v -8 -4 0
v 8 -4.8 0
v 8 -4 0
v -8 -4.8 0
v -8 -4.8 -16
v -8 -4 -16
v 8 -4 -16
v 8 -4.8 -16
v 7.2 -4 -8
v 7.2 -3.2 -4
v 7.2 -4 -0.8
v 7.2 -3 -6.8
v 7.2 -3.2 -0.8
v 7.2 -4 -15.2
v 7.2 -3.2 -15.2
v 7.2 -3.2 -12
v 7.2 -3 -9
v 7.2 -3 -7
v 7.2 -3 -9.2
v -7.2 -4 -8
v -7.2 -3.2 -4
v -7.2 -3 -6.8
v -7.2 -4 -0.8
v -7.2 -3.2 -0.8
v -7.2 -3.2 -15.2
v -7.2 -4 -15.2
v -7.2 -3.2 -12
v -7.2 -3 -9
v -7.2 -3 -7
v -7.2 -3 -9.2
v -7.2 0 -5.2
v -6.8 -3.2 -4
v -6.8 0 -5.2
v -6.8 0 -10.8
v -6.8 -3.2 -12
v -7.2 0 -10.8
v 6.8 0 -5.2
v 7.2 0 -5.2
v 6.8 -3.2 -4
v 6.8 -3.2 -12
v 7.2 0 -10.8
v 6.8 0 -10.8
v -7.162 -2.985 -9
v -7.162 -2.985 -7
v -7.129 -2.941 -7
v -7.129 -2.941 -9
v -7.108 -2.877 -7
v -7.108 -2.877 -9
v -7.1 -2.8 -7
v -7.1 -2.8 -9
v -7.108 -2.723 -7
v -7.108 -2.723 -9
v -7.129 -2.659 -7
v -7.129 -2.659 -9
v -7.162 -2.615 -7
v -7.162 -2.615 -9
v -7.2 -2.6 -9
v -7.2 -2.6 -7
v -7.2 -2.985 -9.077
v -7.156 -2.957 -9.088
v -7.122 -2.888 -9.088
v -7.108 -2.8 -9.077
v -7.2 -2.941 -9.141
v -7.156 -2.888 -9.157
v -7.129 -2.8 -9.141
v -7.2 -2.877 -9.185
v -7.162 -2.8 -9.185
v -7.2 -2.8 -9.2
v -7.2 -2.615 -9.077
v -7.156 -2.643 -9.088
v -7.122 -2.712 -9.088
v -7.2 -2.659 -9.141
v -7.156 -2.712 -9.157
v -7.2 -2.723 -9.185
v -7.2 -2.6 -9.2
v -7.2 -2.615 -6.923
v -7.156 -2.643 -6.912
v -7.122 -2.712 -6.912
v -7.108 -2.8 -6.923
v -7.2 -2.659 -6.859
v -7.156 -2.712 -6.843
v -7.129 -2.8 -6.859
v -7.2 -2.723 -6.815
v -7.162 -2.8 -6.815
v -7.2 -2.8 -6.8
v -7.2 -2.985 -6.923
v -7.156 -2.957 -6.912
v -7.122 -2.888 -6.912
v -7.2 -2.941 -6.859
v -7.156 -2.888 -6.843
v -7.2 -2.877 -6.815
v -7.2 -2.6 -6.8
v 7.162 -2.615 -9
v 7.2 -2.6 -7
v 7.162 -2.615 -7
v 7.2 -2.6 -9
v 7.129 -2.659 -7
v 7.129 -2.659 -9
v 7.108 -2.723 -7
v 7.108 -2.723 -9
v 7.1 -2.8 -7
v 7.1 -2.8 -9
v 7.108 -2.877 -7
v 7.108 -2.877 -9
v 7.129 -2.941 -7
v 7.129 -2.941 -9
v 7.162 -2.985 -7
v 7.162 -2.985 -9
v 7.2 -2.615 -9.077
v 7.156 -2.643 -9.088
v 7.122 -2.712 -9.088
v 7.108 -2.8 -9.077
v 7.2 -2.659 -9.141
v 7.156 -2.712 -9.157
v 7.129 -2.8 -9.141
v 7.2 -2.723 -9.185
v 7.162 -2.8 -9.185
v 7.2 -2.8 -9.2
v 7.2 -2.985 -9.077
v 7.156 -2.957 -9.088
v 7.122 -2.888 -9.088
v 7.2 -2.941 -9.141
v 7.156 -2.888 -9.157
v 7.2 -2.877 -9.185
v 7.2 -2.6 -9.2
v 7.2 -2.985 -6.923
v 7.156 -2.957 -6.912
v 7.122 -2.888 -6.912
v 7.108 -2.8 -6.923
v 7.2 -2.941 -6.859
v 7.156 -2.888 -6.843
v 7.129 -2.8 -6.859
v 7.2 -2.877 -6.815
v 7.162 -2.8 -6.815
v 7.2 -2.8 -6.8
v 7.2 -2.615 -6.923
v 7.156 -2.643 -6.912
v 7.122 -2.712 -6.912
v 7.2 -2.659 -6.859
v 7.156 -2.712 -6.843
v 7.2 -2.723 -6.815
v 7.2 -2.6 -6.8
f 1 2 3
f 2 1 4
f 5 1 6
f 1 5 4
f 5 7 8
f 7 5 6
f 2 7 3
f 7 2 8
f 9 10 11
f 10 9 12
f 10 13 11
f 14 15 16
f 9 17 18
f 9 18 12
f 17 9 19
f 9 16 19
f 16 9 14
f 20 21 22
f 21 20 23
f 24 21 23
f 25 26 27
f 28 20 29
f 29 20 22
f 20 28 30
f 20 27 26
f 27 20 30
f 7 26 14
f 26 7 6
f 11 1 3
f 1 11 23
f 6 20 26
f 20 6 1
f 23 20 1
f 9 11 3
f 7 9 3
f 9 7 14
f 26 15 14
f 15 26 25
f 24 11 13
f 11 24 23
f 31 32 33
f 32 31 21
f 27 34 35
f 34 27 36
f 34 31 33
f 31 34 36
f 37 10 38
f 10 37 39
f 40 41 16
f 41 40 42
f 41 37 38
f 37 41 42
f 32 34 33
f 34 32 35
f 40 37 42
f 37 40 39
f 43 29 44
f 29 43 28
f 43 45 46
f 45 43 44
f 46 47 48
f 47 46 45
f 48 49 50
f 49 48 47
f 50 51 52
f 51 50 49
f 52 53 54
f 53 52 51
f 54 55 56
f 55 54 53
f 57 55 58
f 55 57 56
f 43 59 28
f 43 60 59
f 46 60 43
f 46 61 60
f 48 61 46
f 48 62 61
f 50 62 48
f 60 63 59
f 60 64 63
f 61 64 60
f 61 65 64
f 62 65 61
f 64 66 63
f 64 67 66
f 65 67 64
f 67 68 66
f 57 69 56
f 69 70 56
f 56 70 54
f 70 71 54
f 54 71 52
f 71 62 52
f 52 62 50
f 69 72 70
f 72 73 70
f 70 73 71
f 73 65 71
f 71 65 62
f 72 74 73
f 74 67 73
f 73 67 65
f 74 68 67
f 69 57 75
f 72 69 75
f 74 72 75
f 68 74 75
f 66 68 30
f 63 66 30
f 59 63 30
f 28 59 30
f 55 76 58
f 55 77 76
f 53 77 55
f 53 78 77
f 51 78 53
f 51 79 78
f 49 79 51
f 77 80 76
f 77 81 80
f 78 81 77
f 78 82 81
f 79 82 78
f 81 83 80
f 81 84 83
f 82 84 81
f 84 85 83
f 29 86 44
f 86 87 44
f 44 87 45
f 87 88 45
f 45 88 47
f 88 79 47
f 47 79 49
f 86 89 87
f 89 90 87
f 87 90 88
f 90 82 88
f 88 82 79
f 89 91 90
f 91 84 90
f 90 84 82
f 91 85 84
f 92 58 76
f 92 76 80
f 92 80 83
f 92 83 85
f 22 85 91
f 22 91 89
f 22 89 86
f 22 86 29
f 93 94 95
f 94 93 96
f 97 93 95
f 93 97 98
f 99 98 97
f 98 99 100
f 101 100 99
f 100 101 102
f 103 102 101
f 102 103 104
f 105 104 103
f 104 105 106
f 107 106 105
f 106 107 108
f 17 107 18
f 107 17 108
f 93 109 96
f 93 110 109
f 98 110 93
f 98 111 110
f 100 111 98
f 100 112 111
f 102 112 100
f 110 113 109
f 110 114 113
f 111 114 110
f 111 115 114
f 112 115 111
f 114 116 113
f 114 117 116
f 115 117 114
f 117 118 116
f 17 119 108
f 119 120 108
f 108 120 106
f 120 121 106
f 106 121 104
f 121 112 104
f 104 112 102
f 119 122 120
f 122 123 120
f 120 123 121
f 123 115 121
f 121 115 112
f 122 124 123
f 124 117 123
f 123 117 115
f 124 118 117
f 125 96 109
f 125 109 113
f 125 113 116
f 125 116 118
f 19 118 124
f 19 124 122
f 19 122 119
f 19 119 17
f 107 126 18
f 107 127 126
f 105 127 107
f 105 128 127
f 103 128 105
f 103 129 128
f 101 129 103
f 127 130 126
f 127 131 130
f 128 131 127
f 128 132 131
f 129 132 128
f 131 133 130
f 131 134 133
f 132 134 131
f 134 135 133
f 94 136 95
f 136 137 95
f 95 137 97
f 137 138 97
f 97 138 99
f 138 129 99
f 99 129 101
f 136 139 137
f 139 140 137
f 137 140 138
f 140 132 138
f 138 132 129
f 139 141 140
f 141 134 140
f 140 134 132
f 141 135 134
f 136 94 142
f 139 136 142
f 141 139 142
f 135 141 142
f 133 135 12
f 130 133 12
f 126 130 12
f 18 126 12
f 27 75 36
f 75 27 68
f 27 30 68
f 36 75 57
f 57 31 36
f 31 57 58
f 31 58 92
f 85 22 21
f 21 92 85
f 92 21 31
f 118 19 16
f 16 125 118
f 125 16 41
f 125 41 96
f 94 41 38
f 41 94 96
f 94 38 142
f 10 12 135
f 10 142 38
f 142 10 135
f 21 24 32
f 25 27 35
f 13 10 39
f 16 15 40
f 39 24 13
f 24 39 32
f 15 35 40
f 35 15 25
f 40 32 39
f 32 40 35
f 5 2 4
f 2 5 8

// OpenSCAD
// file: ../p/1-8sphe.scad
use <../lib.scad>
function ldraw_lib__1_8sphe() = [
// 0 Sphere 0.125
// 0 Name: 1-8sphe.dat
// 0 Author: James Jessiman
// 0 !LDRAW_ORG Primitive UPDATE 2012-03
// 0 !LICENSE Licensed under CC BY 4.0 : see CAreadme.txt
// 
// 0 BFC CERTIFY CCW
  [0,"BFC","CERTIFY"],
  [0,"BFC","CCW"],
// 
// 0 !HISTORY 2000-08-01 {Axel Poque} fixes to resolve L3P error messages.
// 0 !HISTORY 2000-08-01 {Manfred Moolhuysen} fixes to resolve L3P error messages.
// 0 !HISTORY 2000-09-30 [PTadmin] Official Update 2000-02
// 0 !HISTORY 2002-03-28 [hafhead] Made BFC compliant
// 0 !HISTORY 2002-04-25 [PTadmin] Official Update 2002-02
// 0 !HISTORY 2007-06-22 [PTadmin] Header formatted for Contributor Agreement
// 0 !HISTORY 2008-07-01 [PTadmin] Official Update 2008-01
// 0 !HISTORY 2010-09-12 [MagFors] Changed winding, removed duplicated cond-line, optimized filesize
// 0 !HISTORY 2010-12-31 [PTadmin] Official Update 2010-03
// 0 !HISTORY 2012-07-01 [tcobbs] Replaced with geometry from LDView
// 0 !HISTORY 2012-12-28 [PTadmin] Official Update 2012-03
// 
// 
// 3 16 1 0 0 0.9239 0.3827 0 0.9239 0 0.3827
  [3,16,1,0,0,0.9239,0.3827,0,0.9239,0,0.3827],
// 3 16 0.9239 0.3827 0 0.7836 0.4393 0.4393 0.9239 0 0.3827
  [3,16,0.9239,0.3827,0,0.7836,0.4393,0.4393,0.9239,0,0.3827],
// 3 16 0.9239 0 0.3827 0.7836 0.4393 0.4393 0.7071 0 0.7071
  [3,16,0.9239,0,0.3827,0.7836,0.4393,0.4393,0.7071,0,0.7071],
// 3 16 0.7836 0.4393 0.4393 0.4393 0.4393 0.7836 0.7071 0 0.7071
  [3,16,0.7836,0.4393,0.4393,0.4393,0.4393,0.7836,0.7071,0,0.7071],
// 3 16 0.7071 0 0.7071 0.4393 0.4393 0.7836 0.3827 0 0.9239
  [3,16,0.7071,0,0.7071,0.4393,0.4393,0.7836,0.3827,0,0.9239],
// 3 16 0.4393 0.4393 0.7836 0 0.3827 0.9239 0.3827 0 0.9239
  [3,16,0.4393,0.4393,0.7836,0,0.3827,0.9239,0.3827,0,0.9239],
// 3 16 0.3827 0 0.9239 0 0.3827 0.9239 0 0 1
  [3,16,0.3827,0,0.9239,0,0.3827,0.9239,0,0,1],
// 3 16 0.9239 0.3827 0 0.7071 0.7071 0 0.7836 0.4393 0.4393
  [3,16,0.9239,0.3827,0,0.7071,0.7071,0,0.7836,0.4393,0.4393],
// 3 16 0.7071 0.7071 0 0.4393 0.7836 0.4393 0.7836 0.4393 0.4393
  [3,16,0.7071,0.7071,0,0.4393,0.7836,0.4393,0.7836,0.4393,0.4393],
// 3 16 0.7836 0.4393 0.4393 0.4393 0.7836 0.4393 0.4393 0.4393 0.7836
  [3,16,0.7836,0.4393,0.4393,0.4393,0.7836,0.4393,0.4393,0.4393,0.7836],
// 3 16 0.4393 0.7836 0.4393 0 0.7071 0.7071 0.4393 0.4393 0.7836
  [3,16,0.4393,0.7836,0.4393,0,0.7071,0.7071,0.4393,0.4393,0.7836],
// 3 16 0.4393 0.4393 0.7836 0 0.7071 0.7071 0 0.3827 0.9239
  [3,16,0.4393,0.4393,0.7836,0,0.7071,0.7071,0,0.3827,0.9239],
// 3 16 0.7071 0.7071 0 0.3827 0.9239 0 0.4393 0.7836 0.4393
  [3,16,0.7071,0.7071,0,0.3827,0.9239,0,0.4393,0.7836,0.4393],
// 3 16 0.3827 0.9239 0 0 0.9239 0.3827 0.4393 0.7836 0.4393
  [3,16,0.3827,0.9239,0,0,0.9239,0.3827,0.4393,0.7836,0.4393],
// 3 16 0.4393 0.7836 0.4393 0 0.9239 0.3827 0 0.7071 0.7071
  [3,16,0.4393,0.7836,0.4393,0,0.9239,0.3827,0,0.7071,0.7071],
// 3 16 0.3827 0.9239 0 0 1 0 0 0.9239 0.3827
  [3,16,0.3827,0.9239,0,0,1,0,0,0.9239,0.3827],
// 
// 5 24 1 0 0 0.9239 0.3827 0 1 0 -0.1 0.9239 0 0.3827
  [5,24,1,0,0,0.9239,0.3827,0,1,0,-0.1,0.9239,0,0.3827],
// 5 24 0.9239 0.3827 0 0.9239 0 0.3827 1 0 0 0.7836 0.4393 0.4393
  [5,24,0.9239,0.3827,0,0.9239,0,0.3827,1,0,0,0.7836,0.4393,0.4393],
// 5 24 1 0 0 0.9239 0 0.3827 0.9239 0.3827 0 1 -0.1 0
  [5,24,1,0,0,0.9239,0,0.3827,0.9239,0.3827,0,1,-0.1,0],
// 5 24 0.9239 0 0.3827 0.7836 0.4393 0.4393 0.9239 0.3827 0 0.7071 0 0.7071
  [5,24,0.9239,0,0.3827,0.7836,0.4393,0.4393,0.9239,0.3827,0,0.7071,0,0.7071],
// 5 24 0.7836 0.4393 0.4393 0.7071 0 0.7071 0.9239 0 0.3827 0.4393 0.4393 0.7836
  [5,24,0.7836,0.4393,0.4393,0.7071,0,0.7071,0.9239,0,0.3827,0.4393,0.4393,0.7836],
// 5 24 0.9239 0 0.3827 0.7071 0 0.7071 0.7836 0.4393 0.4393 0.9239 -0.1 0.3827
  [5,24,0.9239,0,0.3827,0.7071,0,0.7071,0.7836,0.4393,0.4393,0.9239,-0.1,0.3827],
// 5 24 0.7071 0 0.7071 0.4393 0.4393 0.7836 0.7836 0.4393 0.4393 0.3827 0 0.9239
  [5,24,0.7071,0,0.7071,0.4393,0.4393,0.7836,0.7836,0.4393,0.4393,0.3827,0,0.9239],
// 5 24 0.4393 0.4393 0.7836 0.3827 0 0.9239 0.7071 0 0.7071 0 0.3827 0.9239
  [5,24,0.4393,0.4393,0.7836,0.3827,0,0.9239,0.7071,0,0.7071,0,0.3827,0.9239],
// 5 24 0.7071 0 0.7071 0.3827 0 0.9239 0.4393 0.4393 0.7836 0.7071 -0.1 0.7071
  [5,24,0.7071,0,0.7071,0.3827,0,0.9239,0.4393,0.4393,0.7836,0.7071,-0.1,0.7071],
// 5 24 0.3827 0 0.9239 0 0.3827 0.9239 0.4393 0.4393 0.7836 0 0 1
  [5,24,0.3827,0,0.9239,0,0.3827,0.9239,0.4393,0.4393,0.7836,0,0,1],
// 5 24 0 0.3827 0.9239 0 0 1 0.3827 0 0.9239 -0.1 0.3827 0.9239
  [5,24,0,0.3827,0.9239,0,0,1,0.3827,0,0.9239,-0.1,0.3827,0.9239],
// 5 24 0.3827 0 0.9239 0 0 1 0 0.3827 0.9239 0.3827 -0.1 0.9239
  [5,24,0.3827,0,0.9239,0,0,1,0,0.3827,0.9239,0.3827,-0.1,0.9239],
// 5 24 0.9239 0.3827 0 0.7071 0.7071 0 0.9239 0.3827 -0.1 0.7836 0.4393 0.4393
  [5,24,0.9239,0.3827,0,0.7071,0.7071,0,0.9239,0.3827,-0.1,0.7836,0.4393,0.4393],
// 5 24 0.7071 0.7071 0 0.7836 0.4393 0.4393 0.9239 0.3827 0 0.4393 0.7836 0.4393
  [5,24,0.7071,0.7071,0,0.7836,0.4393,0.4393,0.9239,0.3827,0,0.4393,0.7836,0.4393],
// 5 24 0.9239 0.3827 0 0.7836 0.4393 0.4393 0.7071 0.7071 0 0.9239 0 0.3827
  [5,24,0.9239,0.3827,0,0.7836,0.4393,0.4393,0.7071,0.7071,0,0.9239,0,0.3827],
// 5 24 0.7836 0.4393 0.4393 0.4393 0.7836 0.4393 0.7071 0.7071 0 0.4393 0.4393 0.7836
  [5,24,0.7836,0.4393,0.4393,0.4393,0.7836,0.4393,0.7071,0.7071,0,0.4393,0.4393,0.7836],
// 5 24 0.4393 0.7836 0.4393 0.4393 0.4393 0.7836 0.7836 0.4393 0.4393 0 0.7071 0.7071
  [5,24,0.4393,0.7836,0.4393,0.4393,0.4393,0.7836,0.7836,0.4393,0.4393,0,0.7071,0.7071],
// 5 24 0.7836 0.4393 0.4393 0.4393 0.4393 0.7836 0.4393 0.7836 0.4393 0.7071 0 0.7071
  [5,24,0.7836,0.4393,0.4393,0.4393,0.4393,0.7836,0.4393,0.7836,0.4393,0.7071,0,0.7071],
// 5 24 0.4393 0.4393 0.7836 0 0.7071 0.7071 0.4393 0.7836 0.4393 0 0.3827 0.9239
  [5,24,0.4393,0.4393,0.7836,0,0.7071,0.7071,0.4393,0.7836,0.4393,0,0.3827,0.9239],
// 5 24 0 0.7071 0.7071 0 0.3827 0.9239 0.4393 0.4393 0.7836 -0.1 0.7071 0.7071
  [5,24,0,0.7071,0.7071,0,0.3827,0.9239,0.4393,0.4393,0.7836,-0.1,0.7071,0.7071],
// 5 24 0.4393 0.4393 0.7836 0 0.3827 0.9239 0 0.7071 0.7071 0.3827 0 0.9239
  [5,24,0.4393,0.4393,0.7836,0,0.3827,0.9239,0,0.7071,0.7071,0.3827,0,0.9239],
// 5 24 0.7071 0.7071 0 0.3827 0.9239 0 0.7071 0.7071 -0.1 0.4393 0.7836 0.4393
  [5,24,0.7071,0.7071,0,0.3827,0.9239,0,0.7071,0.7071,-0.1,0.4393,0.7836,0.4393],
// 5 24 0.3827 0.9239 0 0.4393 0.7836 0.4393 0.7071 0.7071 0 0 0.9239 0.3827
  [5,24,0.3827,0.9239,0,0.4393,0.7836,0.4393,0.7071,0.7071,0,0,0.9239,0.3827],
// 5 24 0.7071 0.7071 0 0.4393 0.7836 0.4393 0.3827 0.9239 0 0.7836 0.4393 0.4393
  [5,24,0.7071,0.7071,0,0.4393,0.7836,0.4393,0.3827,0.9239,0,0.7836,0.4393,0.4393],
// 5 24 0.4393 0.7836 0.4393 0 0.9239 0.3827 0.3827 0.9239 0 0 0.7071 0.7071
  [5,24,0.4393,0.7836,0.4393,0,0.9239,0.3827,0.3827,0.9239,0,0,0.7071,0.7071],
// 5 24 0 0.9239 0.3827 0 0.7071 0.7071 0.4393 0.7836 0.4393 -0.1 0.9239 0.3827
  [5,24,0,0.9239,0.3827,0,0.7071,0.7071,0.4393,0.7836,0.4393,-0.1,0.9239,0.3827],
// 5 24 0.4393 0.7836 0.4393 0 0.7071 0.7071 0 0.9239 0.3827 0.4393 0.4393 0.7836
  [5,24,0.4393,0.7836,0.4393,0,0.7071,0.7071,0,0.9239,0.3827,0.4393,0.4393,0.7836],
// 5 24 0.3827 0.9239 0 0 1 0 0.3827 0.9239 -0.1 0 0.9239 0.3827
  [5,24,0.3827,0.9239,0,0,1,0,0.3827,0.9239,-0.1,0,0.9239,0.3827],
// 5 24 0 1 0 0 0.9239 0.3827 0.3827 0.9239 0 -0.1 1 0
  [5,24,0,1,0,0,0.9239,0.3827,0.3827,0.9239,0,-0.1,1,0],
// 5 24 0.3827 0.9239 0 0 0.9239 0.3827 0 1 0 0.4393 0.7836 0.4393
  [5,24,0.3827,0.9239,0,0,0.9239,0.3827,0,1,0,0.4393,0.7836,0.4393],
];
module ldraw_lib__1_8sphe(step=0, col=false, unit=2/5, alt=false, line=0.2, solid=!$preview)
    makepoly(ldraw_lib__1_8sphe(), step=step, col=col, unit=unit, alt=alt, line=line, solid=solid);
ldraw_lib__1_8sphe(line=0.2);
// file: ../p/box4.scad
use <../lib.scad>
function ldraw_lib__box4() = [
// 0 Box with 4 Faces (2 Parallel Pairs) and All Edges
// 0 Name: box4.dat
// 0 Author: James Jessiman
// 0 !LDRAW_ORG Primitive UPDATE 2012-01
// 0 !LICENSE Licensed under CC BY 4.0 : see CAreadme.txt
// 
// 0 BFC CERTIFY CCW
  [0,"BFC","CERTIFY"],
  [0,"BFC","CCW"],
// 
// 0 !HISTORY 2002-04-03 [sbliss] Modified for BFC compliance
// 0 !HISTORY 2002-04-25 [PTadmin] Official Update 2002-02
// 0 !HISTORY 2007-06-24 [PTadmin] Header formatted for Contributor Agreement
// 0 !HISTORY 2008-07-01 [PTadmin] Official Update 2008-01
// 0 !HISTORY 2012-02-16 [Philo] Changed to CCW
// 0 !HISTORY 2012-03-30 [PTadmin] Official Update 2012-01
// 
// 
// 2 24 1 1 1 -1 1 1
  [2,24,1,1,1,-1,1,1],
// 2 24 -1 1 1 -1 1 -1
  [2,24,-1,1,1,-1,1,-1],
// 2 24 -1 1 -1 1 1 -1
  [2,24,-1,1,-1,1,1,-1],
// 2 24 1 1 -1 1 1 1
  [2,24,1,1,-1,1,1,1],
// 2 24 1 0 1 -1 0 1
  [2,24,1,0,1,-1,0,1],
// 2 24 -1 0 1 -1 0 -1
  [2,24,-1,0,1,-1,0,-1],
// 2 24 -1 0 -1 1 0 -1
  [2,24,-1,0,-1,1,0,-1],
// 2 24 1 0 -1 1 0 1
  [2,24,1,0,-1,1,0,1],
// 2 24 1 0 1 1 1 1
  [2,24,1,0,1,1,1,1],
// 2 24 -1 0 1 -1 1 1
  [2,24,-1,0,1,-1,1,1],
// 2 24 1 0 -1 1 1 -1
  [2,24,1,0,-1,1,1,-1],
// 2 24 -1 0 -1 -1 1 -1
  [2,24,-1,0,-1,-1,1,-1],
// 4 16 -1 1 1 -1 0 1 1 0 1 1 1 1
  [4,16,-1,1,1,-1,0,1,1,0,1,1,1,1],
// 4 16 -1 1 -1 -1 0 -1 -1 0 1 -1 1 1
  [4,16,-1,1,-1,-1,0,-1,-1,0,1,-1,1,1],
// 4 16 1 1 -1 1 0 -1 -1 0 -1 -1 1 -1
  [4,16,1,1,-1,1,0,-1,-1,0,-1,-1,1,-1],
// 4 16 1 1 1 1 0 1 1 0 -1 1 1 -1
  [4,16,1,1,1,1,0,1,1,0,-1,1,1,-1],
];
module ldraw_lib__box4(step=0, col=false, unit=2/5, alt=false, line=0.2, solid=!$preview)
    makepoly(ldraw_lib__box4(), step=step, col=col, unit=unit, alt=alt, line=line, solid=solid);
ldraw_lib__box4(line=0.2);
// file: ../p/2-8sphe.scad
use <../lib.scad>
use <1-8sphe.scad>
function ldraw_lib__2_8sphe() = [
// 0 Sphere 0.25
// 0 Name: 2-8sphe.dat
// 0 Author: James Jessiman
// 0 !LDRAW_ORG Primitive UPDATE 2003-02
// 0 !LICENSE Licensed under CC BY 4.0 : see CAreadme.txt
// 
// 0 BFC CERTIFY CCW
  [0,"BFC","CERTIFY"],
  [0,"BFC","CCW"],
// 
// 0 !HISTORY 2002-08-31 [izanette] Modified with WINDZ for BFC compliance
// 0 !HISTORY 2003-08-01 [PTadmin] Official Update 2003-02
// 0 !HISTORY 2007-06-24 [PTadmin] Header formatted for Contributor Agreement
// 0 !HISTORY 2008-07-01 [PTadmin] Official Update 2008-01
// 
// 
// 1 16 0 0 0 1 0 0 0 1 0 0 0 1 1-8sphe.dat
  [1,16,0,0,0,1,0,0,0,1,0,0,0,1, ldraw_lib__1_8sphe()],
// 1 16 0 0 0 -1 0 0 0 1 0 0 0 1 1-8sphe.dat
  [1,16,0,0,0,-1,0,0,0,1,0,0,0,1, ldraw_lib__1_8sphe()],
// 0
// 
];
module ldraw_lib__2_8sphe(step=0, col=false, unit=2/5, alt=false, line=0.2, solid=!$preview)
    makepoly(ldraw_lib__2_8sphe(), step=step, col=col, unit=unit, alt=alt, line=line, solid=solid);
ldraw_lib__2_8sphe(line=0.2);
// file: ../p/2-4ndis.scad
use <../lib.scad>
function ldraw_lib__2_4ndis() = [
// 0 Disc Negative 0.5
// 0 Name: 2-4ndis.dat
// 0 Author: James Jessiman
// 0 !LDRAW_ORG Primitive UPDATE 2012-01
// 0 !LICENSE Licensed under CC BY 4.0 : see CAreadme.txt
// 
// 0 BFC CERTIFY CCW
  [0,"BFC","CERTIFY"],
  [0,"BFC","CCW"],
// 
// 0 !HISTORY 2002-03-23 [sbliss] Added BFC statement; compacted code
// 0 !HISTORY 2002-04-25 [PTadmin] Official Update 2002-02
// 0 !HISTORY 2007-06-24 [PTadmin] Header formatted for Contributor Agreement
// 0 !HISTORY 2008-07-01 [PTadmin] Official Update 2008-01
// 0 !HISTORY 2012-02-16 [Philo] Changed to CCW
// 0 !HISTORY 2012-03-30 [PTadmin] Official Update 2012-01
// 
// 
// 3 16 0.9239 0 0.3827 1 0 0 1 0 1
  [3,16,0.9239,0,0.3827,1,0,0,1,0,1],
// 3 16 0.7071 0 0.7071 0.9239 0 0.3827 1 0 1
  [3,16,0.7071,0,0.7071,0.9239,0,0.3827,1,0,1],
// 3 16 0.3827 0 0.9239 0.7071 0 0.7071 1 0 1
  [3,16,0.3827,0,0.9239,0.7071,0,0.7071,1,0,1],
// 3 16 0 0 1 0.3827 0 0.9239 1 0 1
  [3,16,0,0,1,0.3827,0,0.9239,1,0,1],
// 3 16 -0.3827 0 0.9239 0 0 1 -1 0 1
  [3,16,-0.3827,0,0.9239,0,0,1,-1,0,1],
// 3 16 -0.7071 0 0.7071 -0.3827 0 0.9239 -1 0 1
  [3,16,-0.7071,0,0.7071,-0.3827,0,0.9239,-1,0,1],
// 3 16 -0.9239 0 0.3827 -0.7071 0 0.7071 -1 0 1
  [3,16,-0.9239,0,0.3827,-0.7071,0,0.7071,-1,0,1],
// 3 16 -1 0 0 -0.9239 0 0.3827 -1 0 1
  [3,16,-1,0,0,-0.9239,0,0.3827,-1,0,1],
];
module ldraw_lib__2_4ndis(step=0, col=false, unit=2/5, alt=false, line=0.2, solid=!$preview)
    makepoly(ldraw_lib__2_4ndis(), step=step, col=col, unit=unit, alt=alt, line=line, solid=solid);
ldraw_lib__2_4ndis(line=0.2);
// file: ../p/2-4edge.scad
use <../lib.scad>
function ldraw_lib__2_4edge() = [
// 0 Circle 0.5
// 0 Name: 2-4edge.dat
// 0 Author: James Jessiman
// 0 !LDRAW_ORG Primitive UPDATE 2017-01
// 0 !LICENSE Licensed under CC BY 4.0 : see CAreadme.txt
// 
// 0 BFC CERTIFY CCW
  [0,"BFC","CERTIFY"],
  [0,"BFC","CCW"],
// 
// 0 !HISTORY 2007-06-24 [PTadmin] Header formatted for Contributor Agreement
// 0 !HISTORY 2008-07-01 [PTadmin] Official Update 2008-01
// 0 !HISTORY 2017-01-15 [Steffen] BFCed
// 0 !HISTORY 2017-12-30 [PTadmin] Official Update 2017-01
// 
// 
// 2 24 1 0 0 0.9239 0 0.3827
  [2,24,1,0,0,0.9239,0,0.3827],
// 2 24 0.9239 0 0.3827 0.7071 0 0.7071
  [2,24,0.9239,0,0.3827,0.7071,0,0.7071],
// 2 24 0.7071 0 0.7071 0.3827 0 0.9239
  [2,24,0.7071,0,0.7071,0.3827,0,0.9239],
// 2 24 0.3827 0 0.9239 0 0 1
  [2,24,0.3827,0,0.9239,0,0,1],
// 2 24 0 0 1 -0.3827 0 0.9239
  [2,24,0,0,1,-0.3827,0,0.9239],
// 2 24 -0.3827 0 0.9239 -0.7071 0 0.7071
  [2,24,-0.3827,0,0.9239,-0.7071,0,0.7071],
// 2 24 -0.7071 0 0.7071 -0.9239 0 0.3827
  [2,24,-0.7071,0,0.7071,-0.9239,0,0.3827],
// 2 24 -0.9239 0 0.3827 -1 0 0
  [2,24,-0.9239,0,0.3827,-1,0,0],
];
module ldraw_lib__2_4edge(step=0, col=false, unit=2/5, alt=false, line=0.2, solid=!$preview)
    makepoly(ldraw_lib__2_4edge(), step=step, col=col, unit=unit, alt=alt, line=line, solid=solid);
ldraw_lib__2_4edge(line=0.2);
// file: ../p/2-4cyli.scad
use <../lib.scad>
function ldraw_lib__2_4cyli() = [
// 0 Cylinder 0.5
// 0 Name: 2-4cyli.dat
// 0 Author: James Jessiman
// 0 !LDRAW_ORG Primitive UPDATE 2005-01
// 0 !LICENSE Licensed under CC BY 4.0 : see CAreadme.txt
// 
// 0 BFC CERTIFY CCW
  [0,"BFC","CERTIFY"],
  [0,"BFC","CCW"],
// 
// 0 !HISTORY 2002-03-23 [sbliss] Added BFC statement; compacted code
// 0 !HISTORY 2002-04-25 [PTadmin] Official Update 2002-02
// 0 !HISTORY 2004-12-11 [nielsk] Recreated using Primitive Generator, Edge lines fixed, BFC changed to CCW
// 0 !HISTORY 2005-12-28 [PTadmin] Official Update 2005-01
// 0 !HISTORY 2007-06-24 [PTadmin] Header formatted for Contributor Agreement
// 0 !HISTORY 2008-07-01 [PTadmin] Official Update 2008-01
// 
// 
// 4 16 .9239 1 .3827 .9239 0 .3827 1 0 0 1 1 0
  [4,16,.9239,1,.3827,.9239,0,.3827,1,0,0,1,1,0],
// 4 16 .7071 1 .7071 .7071 0 .7071 .9239 0 .3827 .9239 1 .3827
  [4,16,.7071,1,.7071,.7071,0,.7071,.9239,0,.3827,.9239,1,.3827],
// 4 16 .3827 1 .9239 .3827 0 .9239 .7071 0 .7071 .7071 1 .7071
  [4,16,.3827,1,.9239,.3827,0,.9239,.7071,0,.7071,.7071,1,.7071],
// 4 16 0 1 1 0 0 1 .3827 0 .9239 .3827 1 .9239
  [4,16,0,1,1,0,0,1,.3827,0,.9239,.3827,1,.9239],
// 4 16 -.3827 1 .9239 -.3827 0 .9239 0 0 1 0 1 1
  [4,16,-.3827,1,.9239,-.3827,0,.9239,0,0,1,0,1,1],
// 4 16 -.7071 1 .7071 -.7071 0 .7071 -.3827 0 .9239 -.3827 1 .9239
  [4,16,-.7071,1,.7071,-.7071,0,.7071,-.3827,0,.9239,-.3827,1,.9239],
// 4 16 -.9239 1 .3827 -.9239 0 .3827 -.7071 0 .7071 -.7071 1 .7071
  [4,16,-.9239,1,.3827,-.9239,0,.3827,-.7071,0,.7071,-.7071,1,.7071],
// 4 16 -1 1 0 -1 0 0 -.9239 0 .3827 -.9239 1 .3827
  [4,16,-1,1,0,-1,0,0,-.9239,0,.3827,-.9239,1,.3827],
// 5 24 1 1 0 1 0 0 1 1 -.4142 .9239 1 .3827
  [5,24,1,1,0,1,0,0,1,1,-.4142,.9239,1,.3827],
// 5 24 .9239 1 .3827 .9239 0 .3827 1 1 0 .7071 1 .7071
  [5,24,.9239,1,.3827,.9239,0,.3827,1,1,0,.7071,1,.7071],
// 5 24 .7071 1 .7071 .7071 0 .7071 .9239 1 .3827 .3827 1 .9239
  [5,24,.7071,1,.7071,.7071,0,.7071,.9239,1,.3827,.3827,1,.9239],
// 5 24 .3827 1 .9239 .3827 0 .9239 .7071 1 .7071 0 1 1
  [5,24,.3827,1,.9239,.3827,0,.9239,.7071,1,.7071,0,1,1],
// 5 24 0 1 1 0 0 1 .3827 1 .9239 -.3827 1 .9239
  [5,24,0,1,1,0,0,1,.3827,1,.9239,-.3827,1,.9239],
// 5 24 -.3827 1 .9239 -.3827 0 .9239 0 1 1 -.7071 1 .7071
  [5,24,-.3827,1,.9239,-.3827,0,.9239,0,1,1,-.7071,1,.7071],
// 5 24 -.7071 1 .7071 -.7071 0 .7071 -.3827 1 .9239 -.9239 1 .3827
  [5,24,-.7071,1,.7071,-.7071,0,.7071,-.3827,1,.9239,-.9239,1,.3827],
// 5 24 -.9239 1 .3827 -.9239 0 .3827 -.7071 1 .7071 -1 1 0
  [5,24,-.9239,1,.3827,-.9239,0,.3827,-.7071,1,.7071,-1,1,0],
// 5 24 -1 1 0 -1 0 0 -.9239 1 .3827 -1 1 -.4142
  [5,24,-1,1,0,-1,0,0,-.9239,1,.3827,-1,1,-.4142],
// 0
];
module ldraw_lib__2_4cyli(step=0, col=false, unit=2/5, alt=false, line=0.2, solid=!$preview)
    makepoly(ldraw_lib__2_4cyli(), step=step, col=col, unit=unit, alt=alt, line=line, solid=solid);
ldraw_lib__2_4cyli(line=0.2);
// main file
use <../lib.scad>
use <s/2384s01.scad>
function ldraw_lib__2384() = [
// 0 ~Electric Light & Sound Clip-On Plate  2 x  2
// 0 Name: 2384.dat
// 0 Author: Takeshi Takahashi [RainbowDolphin]
// 0 !LDRAW_ORG Part UPDATE 2023-03
// 0 !LICENSE Licensed under CC BY 4.0 : see CAreadme.txt
// 
// 0 BFC CERTIFY CCW
  [0,"BFC","CERTIFY"],
  [0,"BFC","CCW"],
// 
// 0 !HISTORY 2023-06-24 [OrionP] Official Update 2023-03
// 
// 
// 1 16 0 0 0 1 0 0 0 1 0 0 0 1 s\2384s01.dat
  [1,16,0,0,0,1,0,0,0,1,0,0,0,1, ldraw_lib__s__2384s01()],
// 
// 0 // Patternable surface
// 4 16 20 0 -12 -20 0 -12 -20 40 -12 20 40 -12
  [4,16,20,0,-12,-20,0,-12,-20,40,-12,20,40,-12],
];
module ldraw_lib__2384(step=0, col=false, unit=2/5, alt=false, line=0.2, solid=!$preview)
    makepoly(ldraw_lib__2384(), step=step, col=col, unit=unit, alt=alt, line=line, solid=solid);
ldraw_lib__2384(line=0.2);
